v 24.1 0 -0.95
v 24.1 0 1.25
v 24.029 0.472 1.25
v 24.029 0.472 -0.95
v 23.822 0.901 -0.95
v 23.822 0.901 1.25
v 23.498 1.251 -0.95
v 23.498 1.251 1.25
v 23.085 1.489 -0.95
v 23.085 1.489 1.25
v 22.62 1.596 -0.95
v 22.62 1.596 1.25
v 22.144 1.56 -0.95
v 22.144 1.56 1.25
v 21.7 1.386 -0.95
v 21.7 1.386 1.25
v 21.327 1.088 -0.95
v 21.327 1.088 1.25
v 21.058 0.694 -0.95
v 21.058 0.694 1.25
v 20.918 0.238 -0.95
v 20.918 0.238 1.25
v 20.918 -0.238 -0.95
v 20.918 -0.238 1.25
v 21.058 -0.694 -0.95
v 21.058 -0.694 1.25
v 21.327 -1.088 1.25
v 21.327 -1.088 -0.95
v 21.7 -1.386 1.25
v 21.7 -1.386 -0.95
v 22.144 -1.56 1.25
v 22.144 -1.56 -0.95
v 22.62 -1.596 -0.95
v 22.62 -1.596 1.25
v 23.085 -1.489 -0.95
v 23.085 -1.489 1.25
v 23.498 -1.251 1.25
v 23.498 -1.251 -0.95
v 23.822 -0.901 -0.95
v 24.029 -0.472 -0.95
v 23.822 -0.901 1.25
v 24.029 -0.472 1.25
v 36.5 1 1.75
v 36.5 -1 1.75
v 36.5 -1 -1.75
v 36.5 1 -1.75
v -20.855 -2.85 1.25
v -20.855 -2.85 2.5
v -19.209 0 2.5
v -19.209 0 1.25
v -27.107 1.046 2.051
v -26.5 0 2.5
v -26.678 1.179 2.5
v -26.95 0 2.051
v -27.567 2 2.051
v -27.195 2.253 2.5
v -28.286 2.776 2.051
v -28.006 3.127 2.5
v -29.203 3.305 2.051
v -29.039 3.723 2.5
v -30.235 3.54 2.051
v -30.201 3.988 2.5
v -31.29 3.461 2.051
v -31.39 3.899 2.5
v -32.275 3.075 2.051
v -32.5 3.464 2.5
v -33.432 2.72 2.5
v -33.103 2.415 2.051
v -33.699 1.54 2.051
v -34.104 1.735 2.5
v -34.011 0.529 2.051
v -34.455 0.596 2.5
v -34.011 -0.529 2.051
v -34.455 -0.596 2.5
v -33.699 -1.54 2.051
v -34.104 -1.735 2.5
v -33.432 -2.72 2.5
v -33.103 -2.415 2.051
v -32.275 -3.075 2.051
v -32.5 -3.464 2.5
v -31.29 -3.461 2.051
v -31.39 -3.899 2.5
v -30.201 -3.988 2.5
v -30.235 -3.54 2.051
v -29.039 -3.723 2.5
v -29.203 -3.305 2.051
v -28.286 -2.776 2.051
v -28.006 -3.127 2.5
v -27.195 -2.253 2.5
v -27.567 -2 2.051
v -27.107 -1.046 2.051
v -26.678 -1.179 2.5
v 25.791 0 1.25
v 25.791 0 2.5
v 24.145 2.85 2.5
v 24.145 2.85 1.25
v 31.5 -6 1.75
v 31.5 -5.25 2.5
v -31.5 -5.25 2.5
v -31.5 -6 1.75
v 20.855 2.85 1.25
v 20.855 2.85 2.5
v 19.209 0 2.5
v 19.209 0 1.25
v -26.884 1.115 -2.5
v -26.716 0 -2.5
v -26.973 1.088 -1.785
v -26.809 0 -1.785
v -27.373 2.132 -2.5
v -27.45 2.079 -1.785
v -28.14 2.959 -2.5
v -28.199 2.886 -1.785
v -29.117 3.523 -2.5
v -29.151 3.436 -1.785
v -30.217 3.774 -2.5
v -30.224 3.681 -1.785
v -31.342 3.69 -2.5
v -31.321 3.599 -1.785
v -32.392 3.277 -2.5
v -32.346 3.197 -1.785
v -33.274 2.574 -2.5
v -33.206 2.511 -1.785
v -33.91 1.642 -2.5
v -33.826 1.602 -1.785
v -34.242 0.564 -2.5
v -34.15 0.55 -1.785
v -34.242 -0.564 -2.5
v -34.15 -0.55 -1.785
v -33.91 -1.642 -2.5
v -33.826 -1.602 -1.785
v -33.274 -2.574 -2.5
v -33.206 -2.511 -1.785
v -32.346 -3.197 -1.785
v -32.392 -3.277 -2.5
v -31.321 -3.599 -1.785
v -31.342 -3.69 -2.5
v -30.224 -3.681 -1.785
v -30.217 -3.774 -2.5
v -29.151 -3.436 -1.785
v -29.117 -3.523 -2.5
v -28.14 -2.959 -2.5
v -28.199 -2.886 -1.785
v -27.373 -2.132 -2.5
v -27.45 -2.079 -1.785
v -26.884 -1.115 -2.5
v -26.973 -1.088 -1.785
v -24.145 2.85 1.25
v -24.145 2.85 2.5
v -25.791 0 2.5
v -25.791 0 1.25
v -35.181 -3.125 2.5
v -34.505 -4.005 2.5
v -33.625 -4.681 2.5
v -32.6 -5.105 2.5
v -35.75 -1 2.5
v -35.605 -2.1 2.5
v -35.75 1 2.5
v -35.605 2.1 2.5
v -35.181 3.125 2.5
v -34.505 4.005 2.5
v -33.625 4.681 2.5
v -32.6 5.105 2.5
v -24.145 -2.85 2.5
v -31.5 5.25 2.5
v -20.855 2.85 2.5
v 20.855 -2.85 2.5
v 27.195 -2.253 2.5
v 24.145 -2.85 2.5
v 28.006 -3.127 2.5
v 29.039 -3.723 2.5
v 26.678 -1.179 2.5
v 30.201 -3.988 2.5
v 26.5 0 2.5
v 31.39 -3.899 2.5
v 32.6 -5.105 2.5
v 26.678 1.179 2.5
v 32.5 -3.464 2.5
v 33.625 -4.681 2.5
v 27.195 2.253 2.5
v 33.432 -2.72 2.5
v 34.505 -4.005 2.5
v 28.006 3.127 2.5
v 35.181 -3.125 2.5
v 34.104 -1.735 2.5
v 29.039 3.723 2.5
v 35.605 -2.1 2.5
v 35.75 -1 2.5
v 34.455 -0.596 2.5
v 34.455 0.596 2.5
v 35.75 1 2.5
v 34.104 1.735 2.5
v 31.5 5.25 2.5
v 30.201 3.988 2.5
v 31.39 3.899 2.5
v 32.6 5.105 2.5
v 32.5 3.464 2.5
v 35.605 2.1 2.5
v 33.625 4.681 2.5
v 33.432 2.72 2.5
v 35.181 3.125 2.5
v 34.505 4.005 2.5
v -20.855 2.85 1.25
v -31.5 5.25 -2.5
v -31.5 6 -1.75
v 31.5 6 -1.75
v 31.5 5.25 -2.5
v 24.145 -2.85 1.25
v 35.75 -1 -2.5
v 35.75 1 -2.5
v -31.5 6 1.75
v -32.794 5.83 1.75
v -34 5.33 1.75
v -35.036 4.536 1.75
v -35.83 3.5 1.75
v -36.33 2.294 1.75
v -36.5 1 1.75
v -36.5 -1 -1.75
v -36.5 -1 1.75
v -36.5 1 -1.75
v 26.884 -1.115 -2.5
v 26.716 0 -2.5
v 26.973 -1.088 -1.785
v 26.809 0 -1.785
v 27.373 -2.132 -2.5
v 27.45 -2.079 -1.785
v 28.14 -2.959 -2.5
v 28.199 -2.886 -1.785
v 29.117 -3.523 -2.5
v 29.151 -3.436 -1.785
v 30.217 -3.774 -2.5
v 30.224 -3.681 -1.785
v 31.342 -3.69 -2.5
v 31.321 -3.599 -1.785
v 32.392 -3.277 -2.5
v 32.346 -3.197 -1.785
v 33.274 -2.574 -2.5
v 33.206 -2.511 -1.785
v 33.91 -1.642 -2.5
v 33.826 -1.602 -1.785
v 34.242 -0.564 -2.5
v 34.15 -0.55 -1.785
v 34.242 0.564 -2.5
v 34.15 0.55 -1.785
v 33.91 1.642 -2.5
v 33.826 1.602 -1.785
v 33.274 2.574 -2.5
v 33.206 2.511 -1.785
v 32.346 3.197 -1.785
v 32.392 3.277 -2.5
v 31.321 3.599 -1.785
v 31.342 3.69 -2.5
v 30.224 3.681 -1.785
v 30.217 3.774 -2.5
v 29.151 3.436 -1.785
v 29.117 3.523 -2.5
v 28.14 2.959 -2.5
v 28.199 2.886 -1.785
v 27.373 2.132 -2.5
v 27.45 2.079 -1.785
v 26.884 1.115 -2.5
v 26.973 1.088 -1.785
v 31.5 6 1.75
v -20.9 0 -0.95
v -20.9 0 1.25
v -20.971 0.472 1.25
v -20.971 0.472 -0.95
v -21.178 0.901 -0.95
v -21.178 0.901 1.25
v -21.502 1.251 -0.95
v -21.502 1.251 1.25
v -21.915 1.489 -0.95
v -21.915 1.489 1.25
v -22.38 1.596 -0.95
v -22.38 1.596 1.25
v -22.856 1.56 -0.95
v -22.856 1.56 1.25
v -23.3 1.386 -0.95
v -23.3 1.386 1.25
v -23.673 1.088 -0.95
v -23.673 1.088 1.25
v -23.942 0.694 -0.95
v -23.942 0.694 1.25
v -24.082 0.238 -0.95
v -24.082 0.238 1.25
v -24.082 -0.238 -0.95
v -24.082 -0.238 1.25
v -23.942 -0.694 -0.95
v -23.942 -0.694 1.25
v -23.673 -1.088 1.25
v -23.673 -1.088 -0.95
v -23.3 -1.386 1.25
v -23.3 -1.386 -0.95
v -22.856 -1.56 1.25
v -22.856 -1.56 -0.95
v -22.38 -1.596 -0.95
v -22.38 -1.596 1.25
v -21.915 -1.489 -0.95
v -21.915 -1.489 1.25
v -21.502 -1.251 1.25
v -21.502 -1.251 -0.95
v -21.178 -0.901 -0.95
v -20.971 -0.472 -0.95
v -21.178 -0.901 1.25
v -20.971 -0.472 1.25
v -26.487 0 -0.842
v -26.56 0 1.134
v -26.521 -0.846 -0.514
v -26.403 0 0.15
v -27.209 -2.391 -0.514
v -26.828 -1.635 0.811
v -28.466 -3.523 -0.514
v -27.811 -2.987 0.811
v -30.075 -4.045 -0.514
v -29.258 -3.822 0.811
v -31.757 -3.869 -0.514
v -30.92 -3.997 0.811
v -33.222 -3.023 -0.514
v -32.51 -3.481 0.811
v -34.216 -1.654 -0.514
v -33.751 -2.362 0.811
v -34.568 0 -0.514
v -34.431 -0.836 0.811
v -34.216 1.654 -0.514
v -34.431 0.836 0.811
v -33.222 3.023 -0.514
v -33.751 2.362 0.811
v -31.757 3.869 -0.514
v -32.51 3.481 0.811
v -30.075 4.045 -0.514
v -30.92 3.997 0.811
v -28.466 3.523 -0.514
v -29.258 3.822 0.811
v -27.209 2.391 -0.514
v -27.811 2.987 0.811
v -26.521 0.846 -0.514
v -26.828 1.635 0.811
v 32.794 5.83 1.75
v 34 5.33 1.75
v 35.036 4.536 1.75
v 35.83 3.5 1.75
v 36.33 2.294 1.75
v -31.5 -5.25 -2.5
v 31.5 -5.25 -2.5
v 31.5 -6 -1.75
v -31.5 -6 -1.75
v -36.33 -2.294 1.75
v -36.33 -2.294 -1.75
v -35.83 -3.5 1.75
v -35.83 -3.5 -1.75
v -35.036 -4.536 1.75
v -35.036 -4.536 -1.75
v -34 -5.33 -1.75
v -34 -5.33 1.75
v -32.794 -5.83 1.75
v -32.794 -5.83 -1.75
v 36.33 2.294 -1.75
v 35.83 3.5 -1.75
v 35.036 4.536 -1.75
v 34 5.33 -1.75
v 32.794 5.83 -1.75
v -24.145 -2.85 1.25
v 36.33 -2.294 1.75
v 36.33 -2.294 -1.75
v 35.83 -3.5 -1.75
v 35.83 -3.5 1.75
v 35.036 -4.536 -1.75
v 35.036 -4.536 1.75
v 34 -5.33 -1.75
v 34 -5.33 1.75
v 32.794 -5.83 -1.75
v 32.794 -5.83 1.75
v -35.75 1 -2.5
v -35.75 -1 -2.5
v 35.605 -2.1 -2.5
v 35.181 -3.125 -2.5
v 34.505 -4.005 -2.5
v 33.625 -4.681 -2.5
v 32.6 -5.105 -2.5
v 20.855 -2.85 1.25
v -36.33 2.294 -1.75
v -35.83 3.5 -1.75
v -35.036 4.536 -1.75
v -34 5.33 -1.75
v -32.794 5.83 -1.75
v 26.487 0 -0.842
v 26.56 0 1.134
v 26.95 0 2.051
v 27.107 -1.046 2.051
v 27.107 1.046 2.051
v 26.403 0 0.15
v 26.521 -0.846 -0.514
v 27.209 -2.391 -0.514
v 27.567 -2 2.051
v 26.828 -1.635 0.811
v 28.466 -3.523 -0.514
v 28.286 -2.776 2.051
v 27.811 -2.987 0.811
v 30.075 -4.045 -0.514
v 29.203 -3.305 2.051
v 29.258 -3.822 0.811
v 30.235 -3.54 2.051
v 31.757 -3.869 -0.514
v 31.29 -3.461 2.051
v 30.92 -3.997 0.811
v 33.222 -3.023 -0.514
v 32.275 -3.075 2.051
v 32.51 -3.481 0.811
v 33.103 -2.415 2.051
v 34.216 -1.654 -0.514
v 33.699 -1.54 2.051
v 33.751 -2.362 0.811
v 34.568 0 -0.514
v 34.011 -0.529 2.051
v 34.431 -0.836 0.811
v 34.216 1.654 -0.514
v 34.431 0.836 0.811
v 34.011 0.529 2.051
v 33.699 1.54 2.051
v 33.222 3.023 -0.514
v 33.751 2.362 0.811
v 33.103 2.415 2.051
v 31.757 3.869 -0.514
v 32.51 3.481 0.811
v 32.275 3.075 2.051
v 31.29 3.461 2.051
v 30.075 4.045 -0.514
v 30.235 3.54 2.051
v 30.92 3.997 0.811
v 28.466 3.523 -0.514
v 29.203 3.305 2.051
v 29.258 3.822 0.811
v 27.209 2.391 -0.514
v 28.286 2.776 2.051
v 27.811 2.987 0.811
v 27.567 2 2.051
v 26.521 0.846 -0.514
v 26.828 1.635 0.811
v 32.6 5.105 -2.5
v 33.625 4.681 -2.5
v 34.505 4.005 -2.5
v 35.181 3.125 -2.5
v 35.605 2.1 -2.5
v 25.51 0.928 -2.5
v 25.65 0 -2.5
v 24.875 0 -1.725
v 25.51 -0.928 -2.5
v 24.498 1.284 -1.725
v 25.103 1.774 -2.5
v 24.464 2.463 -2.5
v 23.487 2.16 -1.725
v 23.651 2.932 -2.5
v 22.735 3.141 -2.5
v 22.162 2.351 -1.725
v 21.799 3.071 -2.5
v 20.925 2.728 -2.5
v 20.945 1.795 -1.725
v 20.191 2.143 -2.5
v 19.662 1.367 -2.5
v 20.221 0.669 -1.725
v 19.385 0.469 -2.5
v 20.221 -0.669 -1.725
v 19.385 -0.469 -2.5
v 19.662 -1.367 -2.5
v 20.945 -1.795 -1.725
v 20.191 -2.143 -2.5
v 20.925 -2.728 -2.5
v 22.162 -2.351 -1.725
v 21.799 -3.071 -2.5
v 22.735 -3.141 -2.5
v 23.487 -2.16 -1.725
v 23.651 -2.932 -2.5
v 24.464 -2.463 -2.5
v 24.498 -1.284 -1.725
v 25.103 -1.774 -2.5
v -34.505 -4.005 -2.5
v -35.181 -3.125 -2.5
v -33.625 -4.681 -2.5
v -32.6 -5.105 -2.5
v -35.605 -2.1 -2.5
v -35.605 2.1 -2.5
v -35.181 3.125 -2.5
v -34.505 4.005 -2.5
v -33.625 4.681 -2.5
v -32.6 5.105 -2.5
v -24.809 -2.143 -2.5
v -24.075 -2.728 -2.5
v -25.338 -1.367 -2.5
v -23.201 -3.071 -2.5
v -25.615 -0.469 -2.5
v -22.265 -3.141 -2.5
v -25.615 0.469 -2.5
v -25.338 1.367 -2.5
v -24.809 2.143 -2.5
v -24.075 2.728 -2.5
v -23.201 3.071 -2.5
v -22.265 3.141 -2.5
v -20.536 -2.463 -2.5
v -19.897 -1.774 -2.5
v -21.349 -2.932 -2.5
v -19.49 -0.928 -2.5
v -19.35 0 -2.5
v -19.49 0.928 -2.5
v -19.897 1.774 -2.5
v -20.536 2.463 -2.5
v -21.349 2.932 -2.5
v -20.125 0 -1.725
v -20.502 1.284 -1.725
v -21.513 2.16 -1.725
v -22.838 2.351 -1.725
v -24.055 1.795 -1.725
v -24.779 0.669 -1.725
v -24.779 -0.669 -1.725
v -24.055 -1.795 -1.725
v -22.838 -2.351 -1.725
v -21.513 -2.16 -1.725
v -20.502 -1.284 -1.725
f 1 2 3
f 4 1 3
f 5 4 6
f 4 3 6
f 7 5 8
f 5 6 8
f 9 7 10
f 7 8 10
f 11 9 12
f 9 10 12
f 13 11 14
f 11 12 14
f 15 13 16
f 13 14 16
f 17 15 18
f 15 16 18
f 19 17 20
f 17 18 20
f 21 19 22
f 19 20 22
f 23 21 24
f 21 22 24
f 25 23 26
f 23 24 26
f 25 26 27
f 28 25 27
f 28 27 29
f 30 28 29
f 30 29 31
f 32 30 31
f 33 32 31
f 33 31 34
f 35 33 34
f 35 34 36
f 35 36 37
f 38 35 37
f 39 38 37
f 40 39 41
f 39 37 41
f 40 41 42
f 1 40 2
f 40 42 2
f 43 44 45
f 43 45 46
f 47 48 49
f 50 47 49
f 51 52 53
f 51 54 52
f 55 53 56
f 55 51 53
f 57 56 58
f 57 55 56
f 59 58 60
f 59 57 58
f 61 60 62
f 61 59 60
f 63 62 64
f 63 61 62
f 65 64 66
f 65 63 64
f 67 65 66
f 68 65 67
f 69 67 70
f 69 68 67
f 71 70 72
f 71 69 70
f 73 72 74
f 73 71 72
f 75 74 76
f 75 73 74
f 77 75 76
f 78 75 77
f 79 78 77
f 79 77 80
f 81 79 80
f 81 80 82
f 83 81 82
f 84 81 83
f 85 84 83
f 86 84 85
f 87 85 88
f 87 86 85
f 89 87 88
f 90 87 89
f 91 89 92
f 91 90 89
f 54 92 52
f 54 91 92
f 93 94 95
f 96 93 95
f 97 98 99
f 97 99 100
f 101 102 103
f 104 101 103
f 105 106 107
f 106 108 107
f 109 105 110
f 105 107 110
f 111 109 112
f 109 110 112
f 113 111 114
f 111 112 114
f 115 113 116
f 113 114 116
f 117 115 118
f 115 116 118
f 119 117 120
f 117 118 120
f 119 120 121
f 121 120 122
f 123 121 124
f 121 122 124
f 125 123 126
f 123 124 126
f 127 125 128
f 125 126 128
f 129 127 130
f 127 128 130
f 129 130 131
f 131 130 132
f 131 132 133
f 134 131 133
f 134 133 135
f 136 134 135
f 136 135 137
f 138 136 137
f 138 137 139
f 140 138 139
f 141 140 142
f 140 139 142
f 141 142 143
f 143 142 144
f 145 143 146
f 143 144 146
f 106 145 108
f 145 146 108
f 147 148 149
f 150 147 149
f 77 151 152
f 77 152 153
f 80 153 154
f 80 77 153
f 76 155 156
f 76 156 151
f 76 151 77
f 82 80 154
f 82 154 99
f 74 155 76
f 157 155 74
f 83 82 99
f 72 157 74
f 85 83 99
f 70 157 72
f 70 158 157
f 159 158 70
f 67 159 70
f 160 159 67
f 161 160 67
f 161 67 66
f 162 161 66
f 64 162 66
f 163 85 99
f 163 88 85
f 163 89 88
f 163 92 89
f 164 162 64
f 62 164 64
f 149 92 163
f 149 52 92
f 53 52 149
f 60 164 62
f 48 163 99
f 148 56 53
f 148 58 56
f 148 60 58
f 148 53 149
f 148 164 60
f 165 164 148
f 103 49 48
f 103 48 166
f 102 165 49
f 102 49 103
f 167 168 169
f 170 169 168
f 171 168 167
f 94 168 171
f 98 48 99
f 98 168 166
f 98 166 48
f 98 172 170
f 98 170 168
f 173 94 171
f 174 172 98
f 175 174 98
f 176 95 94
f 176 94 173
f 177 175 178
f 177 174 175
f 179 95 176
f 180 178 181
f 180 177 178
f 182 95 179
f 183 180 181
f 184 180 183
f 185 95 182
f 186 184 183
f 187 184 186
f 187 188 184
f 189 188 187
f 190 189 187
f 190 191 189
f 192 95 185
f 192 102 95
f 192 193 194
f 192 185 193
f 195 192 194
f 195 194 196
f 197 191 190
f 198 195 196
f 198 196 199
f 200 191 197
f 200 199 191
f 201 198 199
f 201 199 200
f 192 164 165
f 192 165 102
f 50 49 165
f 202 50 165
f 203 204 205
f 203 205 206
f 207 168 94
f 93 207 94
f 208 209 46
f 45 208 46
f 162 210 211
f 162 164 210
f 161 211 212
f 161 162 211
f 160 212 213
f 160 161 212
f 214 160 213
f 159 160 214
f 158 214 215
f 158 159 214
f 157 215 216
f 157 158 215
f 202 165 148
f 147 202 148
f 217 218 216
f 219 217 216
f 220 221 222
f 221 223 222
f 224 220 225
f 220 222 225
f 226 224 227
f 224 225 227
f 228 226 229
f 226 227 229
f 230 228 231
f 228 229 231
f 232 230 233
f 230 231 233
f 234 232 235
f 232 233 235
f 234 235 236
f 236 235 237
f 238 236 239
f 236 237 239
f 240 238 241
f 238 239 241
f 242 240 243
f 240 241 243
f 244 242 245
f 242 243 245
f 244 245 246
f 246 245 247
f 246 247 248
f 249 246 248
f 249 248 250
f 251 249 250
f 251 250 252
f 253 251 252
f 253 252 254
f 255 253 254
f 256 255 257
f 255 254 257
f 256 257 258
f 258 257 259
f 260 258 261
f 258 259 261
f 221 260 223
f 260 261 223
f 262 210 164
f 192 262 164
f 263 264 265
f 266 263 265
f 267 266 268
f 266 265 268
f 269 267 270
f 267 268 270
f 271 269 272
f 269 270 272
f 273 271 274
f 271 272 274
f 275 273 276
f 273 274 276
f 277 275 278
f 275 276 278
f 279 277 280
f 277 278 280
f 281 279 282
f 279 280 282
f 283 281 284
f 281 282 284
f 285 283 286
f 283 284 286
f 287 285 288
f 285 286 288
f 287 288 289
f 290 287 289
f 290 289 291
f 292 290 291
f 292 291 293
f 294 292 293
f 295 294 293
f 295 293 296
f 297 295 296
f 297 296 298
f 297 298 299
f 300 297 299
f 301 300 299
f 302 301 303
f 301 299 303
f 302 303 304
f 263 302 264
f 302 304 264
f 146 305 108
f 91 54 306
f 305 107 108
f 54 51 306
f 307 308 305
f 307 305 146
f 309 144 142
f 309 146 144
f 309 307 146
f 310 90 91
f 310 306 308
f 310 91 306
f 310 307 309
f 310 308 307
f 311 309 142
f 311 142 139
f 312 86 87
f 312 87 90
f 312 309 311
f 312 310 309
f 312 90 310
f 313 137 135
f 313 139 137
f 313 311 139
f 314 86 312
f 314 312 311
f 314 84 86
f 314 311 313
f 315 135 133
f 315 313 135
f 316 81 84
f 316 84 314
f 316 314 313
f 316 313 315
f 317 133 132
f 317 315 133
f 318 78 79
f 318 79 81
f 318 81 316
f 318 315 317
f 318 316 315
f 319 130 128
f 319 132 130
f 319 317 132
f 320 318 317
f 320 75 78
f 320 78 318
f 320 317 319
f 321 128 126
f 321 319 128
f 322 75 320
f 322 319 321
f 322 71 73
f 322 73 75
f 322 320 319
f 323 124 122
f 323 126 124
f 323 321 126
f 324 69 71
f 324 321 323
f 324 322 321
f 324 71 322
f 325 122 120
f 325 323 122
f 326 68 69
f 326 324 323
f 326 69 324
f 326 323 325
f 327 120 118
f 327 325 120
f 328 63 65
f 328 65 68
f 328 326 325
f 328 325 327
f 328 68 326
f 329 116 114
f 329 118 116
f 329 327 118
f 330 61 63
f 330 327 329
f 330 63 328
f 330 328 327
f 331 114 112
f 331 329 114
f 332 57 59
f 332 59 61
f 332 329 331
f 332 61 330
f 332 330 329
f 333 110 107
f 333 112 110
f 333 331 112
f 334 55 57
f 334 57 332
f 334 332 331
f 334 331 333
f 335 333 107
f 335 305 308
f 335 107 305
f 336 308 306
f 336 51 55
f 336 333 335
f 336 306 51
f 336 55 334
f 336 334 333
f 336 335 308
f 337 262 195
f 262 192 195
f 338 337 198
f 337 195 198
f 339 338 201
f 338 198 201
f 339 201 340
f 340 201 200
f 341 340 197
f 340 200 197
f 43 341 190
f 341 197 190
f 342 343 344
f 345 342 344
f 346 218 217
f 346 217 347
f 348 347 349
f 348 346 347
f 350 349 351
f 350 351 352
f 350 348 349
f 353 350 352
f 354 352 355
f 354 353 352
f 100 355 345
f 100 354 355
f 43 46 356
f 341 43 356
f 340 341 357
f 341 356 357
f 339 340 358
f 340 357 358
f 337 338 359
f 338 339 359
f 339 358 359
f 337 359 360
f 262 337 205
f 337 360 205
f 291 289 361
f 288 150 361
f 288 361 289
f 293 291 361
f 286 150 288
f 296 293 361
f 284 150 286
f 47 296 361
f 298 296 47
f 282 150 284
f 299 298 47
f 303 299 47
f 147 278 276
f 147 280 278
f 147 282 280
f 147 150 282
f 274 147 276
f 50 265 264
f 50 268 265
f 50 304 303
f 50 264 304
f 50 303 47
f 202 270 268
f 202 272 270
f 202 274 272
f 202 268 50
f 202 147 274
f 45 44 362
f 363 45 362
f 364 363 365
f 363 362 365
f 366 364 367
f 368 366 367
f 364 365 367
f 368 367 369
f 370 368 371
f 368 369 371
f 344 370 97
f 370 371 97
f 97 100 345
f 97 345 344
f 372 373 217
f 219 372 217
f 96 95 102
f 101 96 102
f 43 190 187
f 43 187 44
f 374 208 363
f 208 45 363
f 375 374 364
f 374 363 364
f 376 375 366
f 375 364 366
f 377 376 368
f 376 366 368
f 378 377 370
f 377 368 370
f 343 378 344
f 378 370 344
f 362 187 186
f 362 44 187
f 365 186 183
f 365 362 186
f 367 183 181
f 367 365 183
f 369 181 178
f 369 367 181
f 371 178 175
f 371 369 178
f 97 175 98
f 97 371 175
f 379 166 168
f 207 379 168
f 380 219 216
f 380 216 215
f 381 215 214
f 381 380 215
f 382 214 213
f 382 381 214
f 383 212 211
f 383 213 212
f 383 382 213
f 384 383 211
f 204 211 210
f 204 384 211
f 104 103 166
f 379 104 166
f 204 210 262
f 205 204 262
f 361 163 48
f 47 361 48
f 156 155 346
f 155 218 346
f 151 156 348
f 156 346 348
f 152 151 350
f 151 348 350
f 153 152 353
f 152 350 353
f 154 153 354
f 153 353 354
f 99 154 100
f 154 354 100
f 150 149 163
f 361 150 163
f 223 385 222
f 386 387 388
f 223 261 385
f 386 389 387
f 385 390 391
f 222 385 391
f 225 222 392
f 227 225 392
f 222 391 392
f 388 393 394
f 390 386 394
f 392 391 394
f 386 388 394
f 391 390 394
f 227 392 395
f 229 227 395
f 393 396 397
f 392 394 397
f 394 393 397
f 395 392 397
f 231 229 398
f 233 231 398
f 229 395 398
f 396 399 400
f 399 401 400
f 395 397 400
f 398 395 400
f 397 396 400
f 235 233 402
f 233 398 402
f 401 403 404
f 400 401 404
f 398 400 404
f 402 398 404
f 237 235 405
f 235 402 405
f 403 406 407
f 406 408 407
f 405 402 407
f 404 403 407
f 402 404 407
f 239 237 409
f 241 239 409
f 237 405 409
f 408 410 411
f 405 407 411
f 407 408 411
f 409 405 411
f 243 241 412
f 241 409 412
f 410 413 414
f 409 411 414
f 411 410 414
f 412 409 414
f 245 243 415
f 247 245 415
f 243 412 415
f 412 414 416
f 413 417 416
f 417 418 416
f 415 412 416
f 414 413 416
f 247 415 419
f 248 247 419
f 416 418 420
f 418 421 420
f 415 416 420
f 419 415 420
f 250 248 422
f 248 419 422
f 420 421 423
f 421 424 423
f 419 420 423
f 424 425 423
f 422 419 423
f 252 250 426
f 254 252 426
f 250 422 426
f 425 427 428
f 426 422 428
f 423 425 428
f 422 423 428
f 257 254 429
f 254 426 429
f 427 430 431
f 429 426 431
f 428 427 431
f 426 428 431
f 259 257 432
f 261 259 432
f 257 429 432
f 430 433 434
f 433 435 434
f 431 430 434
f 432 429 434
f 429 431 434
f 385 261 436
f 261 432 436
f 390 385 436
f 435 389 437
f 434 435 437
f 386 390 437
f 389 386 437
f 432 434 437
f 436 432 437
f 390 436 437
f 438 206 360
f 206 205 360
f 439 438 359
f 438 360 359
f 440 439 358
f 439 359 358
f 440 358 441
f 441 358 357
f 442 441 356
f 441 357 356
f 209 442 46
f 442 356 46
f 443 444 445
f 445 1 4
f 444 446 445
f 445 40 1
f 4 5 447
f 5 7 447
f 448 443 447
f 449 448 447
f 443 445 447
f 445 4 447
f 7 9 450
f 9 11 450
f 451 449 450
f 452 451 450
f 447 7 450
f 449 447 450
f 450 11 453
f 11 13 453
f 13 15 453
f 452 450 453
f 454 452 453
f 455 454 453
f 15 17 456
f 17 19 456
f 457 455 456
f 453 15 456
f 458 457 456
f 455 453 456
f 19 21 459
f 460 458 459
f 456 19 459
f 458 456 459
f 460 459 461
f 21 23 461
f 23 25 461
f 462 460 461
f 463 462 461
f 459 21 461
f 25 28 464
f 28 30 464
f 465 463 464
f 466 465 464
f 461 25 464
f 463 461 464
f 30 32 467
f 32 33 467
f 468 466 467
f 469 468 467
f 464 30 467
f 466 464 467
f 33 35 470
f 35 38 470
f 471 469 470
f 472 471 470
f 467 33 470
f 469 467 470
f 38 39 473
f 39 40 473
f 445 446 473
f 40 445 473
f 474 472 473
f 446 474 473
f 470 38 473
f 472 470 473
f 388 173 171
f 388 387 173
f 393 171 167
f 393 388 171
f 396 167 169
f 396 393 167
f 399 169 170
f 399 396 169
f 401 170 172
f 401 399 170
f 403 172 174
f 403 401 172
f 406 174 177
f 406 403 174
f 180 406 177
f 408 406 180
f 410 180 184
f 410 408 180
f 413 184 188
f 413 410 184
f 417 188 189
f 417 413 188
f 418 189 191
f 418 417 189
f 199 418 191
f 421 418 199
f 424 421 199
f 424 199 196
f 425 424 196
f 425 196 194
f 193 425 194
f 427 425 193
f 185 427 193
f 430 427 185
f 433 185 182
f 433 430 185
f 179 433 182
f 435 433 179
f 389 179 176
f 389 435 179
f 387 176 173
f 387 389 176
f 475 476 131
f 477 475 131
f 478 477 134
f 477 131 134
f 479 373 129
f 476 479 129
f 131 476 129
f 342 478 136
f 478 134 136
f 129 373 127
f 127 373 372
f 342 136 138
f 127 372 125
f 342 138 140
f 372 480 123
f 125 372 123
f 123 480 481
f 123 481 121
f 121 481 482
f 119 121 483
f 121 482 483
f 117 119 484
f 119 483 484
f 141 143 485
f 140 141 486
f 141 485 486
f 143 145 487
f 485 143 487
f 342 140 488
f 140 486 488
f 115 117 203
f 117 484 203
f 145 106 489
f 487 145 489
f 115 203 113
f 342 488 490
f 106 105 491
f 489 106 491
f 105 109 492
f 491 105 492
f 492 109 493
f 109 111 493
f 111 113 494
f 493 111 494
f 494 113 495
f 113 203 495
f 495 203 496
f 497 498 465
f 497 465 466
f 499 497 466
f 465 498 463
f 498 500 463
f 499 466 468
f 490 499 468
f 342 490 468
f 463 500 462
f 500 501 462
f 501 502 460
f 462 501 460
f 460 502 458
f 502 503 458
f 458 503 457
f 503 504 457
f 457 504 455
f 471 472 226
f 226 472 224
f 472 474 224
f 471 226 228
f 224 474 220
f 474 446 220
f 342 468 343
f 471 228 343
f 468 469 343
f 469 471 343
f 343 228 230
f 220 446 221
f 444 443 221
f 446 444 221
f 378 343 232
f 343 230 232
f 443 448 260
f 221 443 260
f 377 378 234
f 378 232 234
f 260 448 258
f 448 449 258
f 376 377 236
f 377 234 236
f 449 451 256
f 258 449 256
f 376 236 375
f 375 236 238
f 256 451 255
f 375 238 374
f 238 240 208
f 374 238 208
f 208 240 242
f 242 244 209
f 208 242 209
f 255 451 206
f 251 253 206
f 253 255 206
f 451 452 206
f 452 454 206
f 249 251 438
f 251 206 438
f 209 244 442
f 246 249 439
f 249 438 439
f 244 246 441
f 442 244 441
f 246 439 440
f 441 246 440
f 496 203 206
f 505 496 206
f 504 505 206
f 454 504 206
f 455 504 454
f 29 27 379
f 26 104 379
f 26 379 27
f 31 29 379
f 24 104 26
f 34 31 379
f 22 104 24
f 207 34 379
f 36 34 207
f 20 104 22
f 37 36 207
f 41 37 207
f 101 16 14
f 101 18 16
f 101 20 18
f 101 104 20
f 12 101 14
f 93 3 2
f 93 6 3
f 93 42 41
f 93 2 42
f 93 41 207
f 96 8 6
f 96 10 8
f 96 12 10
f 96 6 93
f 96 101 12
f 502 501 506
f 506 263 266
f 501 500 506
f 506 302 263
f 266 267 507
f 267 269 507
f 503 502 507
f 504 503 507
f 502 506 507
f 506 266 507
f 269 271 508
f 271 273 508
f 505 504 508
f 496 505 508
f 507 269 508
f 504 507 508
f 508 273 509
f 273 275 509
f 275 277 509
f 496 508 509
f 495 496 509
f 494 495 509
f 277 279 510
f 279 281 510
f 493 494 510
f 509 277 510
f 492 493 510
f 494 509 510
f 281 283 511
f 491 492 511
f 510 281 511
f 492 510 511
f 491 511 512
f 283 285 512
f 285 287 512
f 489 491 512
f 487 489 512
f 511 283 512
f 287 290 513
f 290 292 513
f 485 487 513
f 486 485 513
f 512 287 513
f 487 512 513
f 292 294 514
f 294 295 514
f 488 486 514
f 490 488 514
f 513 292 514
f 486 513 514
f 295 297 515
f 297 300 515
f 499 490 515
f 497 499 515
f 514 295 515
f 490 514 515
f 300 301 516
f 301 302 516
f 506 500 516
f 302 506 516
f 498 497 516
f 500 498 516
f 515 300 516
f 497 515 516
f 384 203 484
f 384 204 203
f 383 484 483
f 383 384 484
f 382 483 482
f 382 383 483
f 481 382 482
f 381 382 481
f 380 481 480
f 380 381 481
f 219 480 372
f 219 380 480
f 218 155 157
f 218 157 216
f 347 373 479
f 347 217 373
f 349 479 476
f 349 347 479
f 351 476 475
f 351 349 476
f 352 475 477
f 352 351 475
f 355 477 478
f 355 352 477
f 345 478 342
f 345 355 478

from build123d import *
from build123d.topology import SkipClean

# Parameters (mm, degrees)
SKETCH1_W                                           = 73
SKETCH1_H                                           = 12
SKETCH1_R                                           = 2.5
BOSS_EXTRUDE1_DEPTH                                 = 2.5
FILLET1_R                                           = 5
CHAMFER1_SIZE                                       = 0.75
CHAMFER1_SIZE_2                                     = 0.534818385
CSK_FOR_M3_COUNTERSUNK_FLAT_HEAD_SCREW1_D           = 3.2
CSK_FOR_M3_COUNTERSUNK_FLAT_HEAD_SCREW1_CSINK_D     = 6.3
CSK_FOR_M3_COUNTERSUNK_FLAT_HEAD_SCREW1_CSINK_ANGLE = 90
CUT_EXTRUDE1_DEPTH                                  = 1.25


with BuildPart() as part:
    # Sketch1 → Boss-Extrude1 (new, symmetric)
    with BuildSketch(Plane.XY):
        Rectangle(SKETCH1_W, SKETCH1_H)
        with Locations((-30.5, 0)):
            Circle(SKETCH1_R, mode=Mode.SUBTRACT)
        with Locations((30.5, 0)):
            Circle(SKETCH1_R, mode=Mode.SUBTRACT)
    extrude(amount=BOSS_EXTRUDE1_DEPTH, both=True)

    # Sketch2 → Cut-Revolve1 (revolve, cut)
    with SkipClean():  # the faces are left unmerged after this step: merging them gives an invalid solid
        with BuildSketch(Plane(origin=(0, 0, 0), x_dir=(1, 0, 0), z_dir=(0, 1, 0)), mode=Mode.PRIVATE) as cut_revolve1_sk:
            with BuildLine():
                ThreePointArc((-30.5, 4.1), (-34.6, 0), (-30.5, -4.1))
                Line((-30.5, -4.1), (-30.5, 4.1))
            make_face()
            with BuildLine():
                Line((-30.5, 4.1), (-30.5, -4.1))
                ThreePointArc((-30.5, -4.1), (-27.600862197, -2.899137803), (-26.4, 0))
                ThreePointArc((-26.4, 0), (-27.600862197, 2.899137803), (-30.5, 4.1))
            make_face()
        cut_revolve1 = revolve(cut_revolve1_sk.sketch.rotate(Axis((-30.5, 0, 14.750329737), (0, 0, -1)), 180), axis=Axis((-30.5, 0, 14.750329737), (0, 0, -1)), mode=Mode.SUBTRACT)
    add(part.part.scale(1), mode=Mode.REPLACE)  # the faces are merged on a copy

    # Mirror1: Cut-Revolve1 across plane
    add(cut_revolve1.mirror(Plane(origin=(0, 0, 0), x_dir=(0, 0, 1), z_dir=(1, 0, 0))), mode=Mode.SUBTRACT)

    # Fillet1
    fillet1_edges = [part.edges().sort_by_distance(p)[0] for p in [
        (36.5, -6, 0),
        (-36.5, -6, 0),
        (-36.5, 6, 0),
        (36.5, 6, 0),
    ]]
    fillet(fillet1_edges, radius=FILLET1_R)

    # Chamfer1
    # the kernel refuses this chamfer: 0.75, 0.534818385 mm, written as the material it takes off along each edge
    with BuildSketch(Plane(origin=(-30.5, 0, 2.5), x_dir=(1, 0, 0), z_dir=(0, -1, 0))) as chamfer1_piece_1:
        with BuildLine():
            Line((3.249615362 + CHAMFER1_SIZE, 0), (3.550305573, -0.449309789))
            ThreePointArc((3.550305573, -0.449309789), (3.409004663, -0.222130994), (3.249615362, 0))
            Line((3.249615362, 0), (3.249615362 + CHAMFER1_SIZE, 0))
        make_face()
    revolve(axis=Axis((-30.5, 0, 2.5), (0, 0, 1)), mode=Mode.SUBTRACT)
    with BuildSketch(Plane(origin=(30.5, 0, 2.5), x_dir=(-1, 0, 0), z_dir=(0, 1, 0))) as chamfer1_piece_2:
        with BuildLine():
            Line((3.249615362 + CHAMFER1_SIZE, 0), (3.550305573, -0.449309789))
            ThreePointArc((3.550305573, -0.449309789), (3.409004663, -0.222130994), (3.249615362, 0))
            Line((3.249615362, 0), (3.249615362 + CHAMFER1_SIZE, 0))
        make_face()
    revolve(axis=Axis((30.5, 0, 2.5), (0, 0, 1)), mode=Mode.SUBTRACT)
    with BuildSketch(Plane(origin=(-30.5, 0, -2.5), x_dir=(1, 0, 0), z_dir=(0, -1, 0))) as chamfer1_piece_3:
        with BuildLine():
            Line((3.249615362 + CHAMFER1_SIZE_2, 0), (3.691177382, 0.715284467))
            ThreePointArc((3.691177382, 0.715284467), (3.494921898, 0.356283384), (3.249615362, 0))
            Line((3.249615362, 0), (3.249615362 + CHAMFER1_SIZE_2, 0))
        make_face()
    revolve(axis=Axis((-30.5, 0, -2.5), (0, 0, 1)), mode=Mode.SUBTRACT)
    with BuildSketch(Plane(origin=(30.5, 0, -2.5), x_dir=(-1, 0, 0), z_dir=(0, 1, 0))) as chamfer1_piece_4:
        with BuildLine():
            Line((3.249615362 + CHAMFER1_SIZE_2, 0), (3.691177382, 0.715284467))
            ThreePointArc((3.691177382, 0.715284467), (3.494921898, 0.356283384), (3.249615362, 0))
            Line((3.249615362, 0), (3.249615362 + CHAMFER1_SIZE_2, 0))
        make_face()
    revolve(axis=Axis((30.5, 0, -2.5), (0, 0, 1)), mode=Mode.SUBTRACT)
    with BuildSketch(Plane(origin=(-31.5, 6, -2.5), x_dir=(0, 0, 1), z_dir=(1, 0, 0)), Plane(origin=(31.5, -6, 2.5), x_dir=(0, 1, 0), z_dir=(-1, 0, 0))) as chamfer1_piece_5:
        Polygon((CHAMFER1_SIZE, 0), (0, CHAMFER1_SIZE), (0, 0), align=None)
    extrude(amount=63, mode=Mode.SUBTRACT)
    with BuildSketch(Plane(origin=(-31.5, 6, 2.5), x_dir=(0, 0, -1), z_dir=(1, 0, 0)), Plane(origin=(31.5, -6, -2.5), x_dir=(0, 1, 0), z_dir=(-1, 0, 0))) as chamfer1_piece_6:
        Polygon((CHAMFER1_SIZE, 0), (0, -CHAMFER1_SIZE), (0, 0), align=None)
    extrude(amount=63, mode=Mode.SUBTRACT)
    with BuildSketch(Plane(origin=(36.5, 1, -2.5), x_dir=(-1, 0, 0), z_dir=(0, -1, 0)), Plane(origin=(-36.5, -1, -2.5), x_dir=(1, 0, 0), z_dir=(0, 1, 0))) as chamfer1_piece_7:
        Polygon((CHAMFER1_SIZE, 0), (0, -CHAMFER1_SIZE), (0, 0), align=None)
    extrude(amount=2, mode=Mode.SUBTRACT)
    with BuildSketch(Plane(origin=(-31.5, -1, -2.5), x_dir=(-1, 0, 0), z_dir=(0, 1, 0))) as chamfer1_piece_8:
        Polygon((5 - CHAMFER1_SIZE, 0), (5, CHAMFER1_SIZE), (5, 0), align=None)
    revolve(axis=Axis((-31.5, -1, -2.5), (0, 0, 1)), revolution_arc=90, mode=Mode.SUBTRACT)
    with BuildSketch(Plane(origin=(-31.5, 1, -2.5), x_dir=(0, 1, 0), z_dir=(1, 0, 0))) as chamfer1_piece_9:
        Polygon((5 - CHAMFER1_SIZE, 0), (5, CHAMFER1_SIZE), (5, 0), align=None)
    revolve(axis=Axis((-31.5, 1, -2.5), (0, 0, 1)), revolution_arc=90, mode=Mode.SUBTRACT)
    with BuildSketch(Plane(origin=(31.5, -1, -2.5), x_dir=(1, 0, 0), z_dir=(0, 1, 0))) as chamfer1_piece_10:
        Polygon((5 - CHAMFER1_SIZE, 0), (5, -CHAMFER1_SIZE), (5, 0), align=None)
    revolve(axis=Axis((31.5, -1, -2.5), (0, 0, -1)), revolution_arc=90, mode=Mode.SUBTRACT)
    with BuildSketch(Plane(origin=(31.5, 1, -2.5), x_dir=(0, 1, 0), z_dir=(-1, 0, 0))) as chamfer1_piece_11:
        Polygon((5 - CHAMFER1_SIZE, 0), (5, -CHAMFER1_SIZE), (5, 0), align=None)
    revolve(axis=Axis((31.5, 1, -2.5), (0, 0, -1)), revolution_arc=90, mode=Mode.SUBTRACT)
    with BuildSketch(Plane(origin=(36.5, 1, 2.5), x_dir=(-1, 0, 0), z_dir=(0, -1, 0)), Plane(origin=(-36.5, -1, 2.5), x_dir=(1, 0, 0), z_dir=(0, 1, 0))) as chamfer1_piece_12:
        Polygon((CHAMFER1_SIZE, 0), (0, CHAMFER1_SIZE), (0, 0), align=None)
    extrude(amount=2, mode=Mode.SUBTRACT)
    with BuildSketch(Plane(origin=(-31.5, -1, 2.5), x_dir=(-1, 0, 0), z_dir=(0, 1, 0))) as chamfer1_piece_13:
        Polygon((5 - CHAMFER1_SIZE, 0), (5, -CHAMFER1_SIZE), (5, 0), align=None)
    revolve(axis=Axis((-31.5, -1, 2.5), (0, 0, 1)), revolution_arc=90, mode=Mode.SUBTRACT)
    with BuildSketch(Plane(origin=(-31.5, 1, 2.5), x_dir=(0, 1, 0), z_dir=(1, 0, 0))) as chamfer1_piece_14:
        Polygon((5, -CHAMFER1_SIZE), (5 - CHAMFER1_SIZE, 0), (5, 0), align=None)
    revolve(axis=Axis((-31.5, 1, 2.5), (0, 0, 1)), revolution_arc=90, mode=Mode.SUBTRACT)
    with BuildSketch(Plane(origin=(31.5, -1, 2.5), x_dir=(1, 0, 0), z_dir=(0, 1, 0))) as chamfer1_piece_15:
        Polygon((5 - CHAMFER1_SIZE, 0), (5, CHAMFER1_SIZE), (5, 0), align=None)
    revolve(axis=Axis((31.5, -1, 2.5), (0, 0, -1)), revolution_arc=90, mode=Mode.SUBTRACT)
    with BuildSketch(Plane(origin=(31.5, 1, 2.5), x_dir=(0, 1, 0), z_dir=(-1, 0, 0))) as chamfer1_piece_16:
        Polygon((5, CHAMFER1_SIZE), (5 - CHAMFER1_SIZE, 0), (5, 0), align=None)
    revolve(axis=Axis((31.5, 1, 2.5), (0, 0, -1)), revolution_arc=90, mode=Mode.SUBTRACT)

    # CSK for M3 Countersunk Flat Head Screw1 (through all)
    with Locations(Plane(origin=(0, 0, -2.5), x_dir=(-1, 0, 0), z_dir=(0, 0, -1))):
        with Locations((-22.5, 0), (22.5, 0)):
            CounterSinkHole(CSK_FOR_M3_COUNTERSUNK_FLAT_HEAD_SCREW1_D / 2, CSK_FOR_M3_COUNTERSUNK_FLAT_HEAD_SCREW1_CSINK_D / 2, counter_sink_angle=CSK_FOR_M3_COUNTERSUNK_FLAT_HEAD_SCREW1_CSINK_ANGLE)

    # Sketch6 → Cut-Extrude1 (cut)
    with BuildSketch(Plane.XY.offset(2.5)):
        Polygon((-19.209103466, 0), (-20.854551733, 2.85), (-24.145448267, 2.85), (-25.790896534, 0), (-24.145448267, -2.85), (-20.854551733, -2.85), align=None)
        Polygon((19.209103466, 0), (20.854551733, -2.85), (24.145448267, -2.85), (25.790896534, 0), (24.145448267, 2.85), (20.854551733, 2.85), align=None)
    extrude(amount=-CUT_EXTRUDE1_DEPTH, mode=Mode.SUBTRACT)


solid = part.part
